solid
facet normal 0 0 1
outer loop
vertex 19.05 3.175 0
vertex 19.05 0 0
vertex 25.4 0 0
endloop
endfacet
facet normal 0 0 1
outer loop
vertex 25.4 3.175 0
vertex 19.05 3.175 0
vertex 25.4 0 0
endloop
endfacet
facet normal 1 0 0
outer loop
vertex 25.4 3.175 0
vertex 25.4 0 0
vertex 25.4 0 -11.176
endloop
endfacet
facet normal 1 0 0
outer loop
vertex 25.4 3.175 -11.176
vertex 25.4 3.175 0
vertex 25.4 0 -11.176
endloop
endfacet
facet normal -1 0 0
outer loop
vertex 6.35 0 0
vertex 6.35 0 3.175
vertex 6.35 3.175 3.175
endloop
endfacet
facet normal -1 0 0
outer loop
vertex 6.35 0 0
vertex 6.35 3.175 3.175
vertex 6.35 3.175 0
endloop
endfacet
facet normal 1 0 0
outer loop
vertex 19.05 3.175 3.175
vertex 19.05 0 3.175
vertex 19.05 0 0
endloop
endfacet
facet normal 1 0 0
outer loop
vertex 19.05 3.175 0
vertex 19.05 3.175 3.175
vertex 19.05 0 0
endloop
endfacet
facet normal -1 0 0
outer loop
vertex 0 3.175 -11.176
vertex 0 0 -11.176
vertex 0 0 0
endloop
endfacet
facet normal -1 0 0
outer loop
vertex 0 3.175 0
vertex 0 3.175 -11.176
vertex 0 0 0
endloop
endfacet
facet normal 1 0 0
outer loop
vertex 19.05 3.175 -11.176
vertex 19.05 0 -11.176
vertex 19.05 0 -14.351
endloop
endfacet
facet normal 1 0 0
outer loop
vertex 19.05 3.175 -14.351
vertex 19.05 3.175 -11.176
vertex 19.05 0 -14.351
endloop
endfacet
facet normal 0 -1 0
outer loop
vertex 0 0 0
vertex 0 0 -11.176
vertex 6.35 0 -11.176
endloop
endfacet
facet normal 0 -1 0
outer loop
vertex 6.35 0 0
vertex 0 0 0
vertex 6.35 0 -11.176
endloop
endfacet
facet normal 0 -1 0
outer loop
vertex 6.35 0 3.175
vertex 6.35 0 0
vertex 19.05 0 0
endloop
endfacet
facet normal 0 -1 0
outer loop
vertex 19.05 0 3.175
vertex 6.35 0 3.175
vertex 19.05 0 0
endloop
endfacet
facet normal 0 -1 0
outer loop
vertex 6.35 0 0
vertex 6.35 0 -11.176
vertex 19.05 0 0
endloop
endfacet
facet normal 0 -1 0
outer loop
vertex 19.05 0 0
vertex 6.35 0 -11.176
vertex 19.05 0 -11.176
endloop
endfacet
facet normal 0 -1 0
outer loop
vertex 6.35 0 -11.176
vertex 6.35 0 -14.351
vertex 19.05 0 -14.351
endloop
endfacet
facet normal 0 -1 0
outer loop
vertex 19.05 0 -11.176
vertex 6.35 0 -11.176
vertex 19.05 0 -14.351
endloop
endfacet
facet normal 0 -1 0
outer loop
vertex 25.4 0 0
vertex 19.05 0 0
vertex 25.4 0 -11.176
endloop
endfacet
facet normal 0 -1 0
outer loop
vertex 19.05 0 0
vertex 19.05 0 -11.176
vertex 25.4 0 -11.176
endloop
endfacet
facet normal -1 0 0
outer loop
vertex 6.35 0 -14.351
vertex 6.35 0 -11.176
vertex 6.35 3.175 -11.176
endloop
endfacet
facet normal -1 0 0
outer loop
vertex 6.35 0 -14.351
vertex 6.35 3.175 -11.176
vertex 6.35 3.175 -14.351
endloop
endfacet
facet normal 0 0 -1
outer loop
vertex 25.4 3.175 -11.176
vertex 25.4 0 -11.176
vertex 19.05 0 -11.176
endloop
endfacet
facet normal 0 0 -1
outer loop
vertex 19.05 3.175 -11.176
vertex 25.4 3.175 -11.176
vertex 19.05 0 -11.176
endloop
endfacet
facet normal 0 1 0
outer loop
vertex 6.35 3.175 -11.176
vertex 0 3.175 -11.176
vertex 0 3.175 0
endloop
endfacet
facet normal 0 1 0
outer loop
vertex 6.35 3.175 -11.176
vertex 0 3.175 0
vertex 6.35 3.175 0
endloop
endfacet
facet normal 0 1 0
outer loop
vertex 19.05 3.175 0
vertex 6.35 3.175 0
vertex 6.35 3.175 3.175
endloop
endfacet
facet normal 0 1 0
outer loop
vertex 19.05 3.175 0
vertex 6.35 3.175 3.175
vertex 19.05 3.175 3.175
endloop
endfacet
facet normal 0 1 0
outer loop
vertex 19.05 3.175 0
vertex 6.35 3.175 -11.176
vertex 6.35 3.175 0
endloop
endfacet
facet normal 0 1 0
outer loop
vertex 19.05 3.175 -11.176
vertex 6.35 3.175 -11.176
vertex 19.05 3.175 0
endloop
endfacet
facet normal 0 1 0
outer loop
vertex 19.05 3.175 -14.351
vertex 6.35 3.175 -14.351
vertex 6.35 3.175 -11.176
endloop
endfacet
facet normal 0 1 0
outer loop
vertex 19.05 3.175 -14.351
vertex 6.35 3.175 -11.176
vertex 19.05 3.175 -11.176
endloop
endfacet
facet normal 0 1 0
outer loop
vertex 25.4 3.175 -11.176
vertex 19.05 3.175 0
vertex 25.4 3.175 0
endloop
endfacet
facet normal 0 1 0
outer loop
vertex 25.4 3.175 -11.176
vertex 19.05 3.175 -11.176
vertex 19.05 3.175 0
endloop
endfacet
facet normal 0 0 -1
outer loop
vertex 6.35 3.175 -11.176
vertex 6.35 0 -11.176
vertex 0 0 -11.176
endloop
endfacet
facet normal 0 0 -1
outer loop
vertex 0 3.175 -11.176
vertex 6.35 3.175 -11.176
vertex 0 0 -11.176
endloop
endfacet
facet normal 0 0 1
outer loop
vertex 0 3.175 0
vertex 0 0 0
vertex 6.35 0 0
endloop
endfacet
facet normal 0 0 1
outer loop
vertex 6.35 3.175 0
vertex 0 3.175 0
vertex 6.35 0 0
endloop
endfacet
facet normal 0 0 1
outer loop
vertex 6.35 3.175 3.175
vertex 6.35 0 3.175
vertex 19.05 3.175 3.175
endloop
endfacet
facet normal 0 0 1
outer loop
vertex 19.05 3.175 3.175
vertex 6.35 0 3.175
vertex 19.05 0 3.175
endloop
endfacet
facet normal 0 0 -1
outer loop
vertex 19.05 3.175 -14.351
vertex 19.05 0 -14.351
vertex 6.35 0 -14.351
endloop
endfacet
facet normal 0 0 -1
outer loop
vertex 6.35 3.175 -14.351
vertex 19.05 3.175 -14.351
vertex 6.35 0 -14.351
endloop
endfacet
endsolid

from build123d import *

# Parameters (mm, degrees)
SKETCH1_W           = 12.7
SKETCH1_H           = 3.175
SKETCH1_W_2         = 6.35
BOSS_EXTRUDE1_DEPTH = 3.175


with BuildPart() as part:
    # Sketch1 → Boss-Extrude1 (new body)
    with BuildSketch(Plane(origin=(0, 0, 0), x_dir=(1, 0, 0), z_dir=(0, 1, 0))):
        Polygon((0, 11.176), (0, 0), (6.35, 0), (19.05, 0), (25.4, 0), (25.4, 11.176), (19.05, 11.176), (12.7, 11.176), (6.35, 11.176), align=None)
        with Locations((12.7, -1.5875)):
            Rectangle(SKETCH1_W, SKETCH1_H)
        with Locations((15.875, 12.7635)):
            Rectangle(SKETCH1_W_2, SKETCH1_H)
        with Locations((9.525, 12.7635)):
            Rectangle(SKETCH1_W_2, SKETCH1_H)
    extrude(amount=BOSS_EXTRUDE1_DEPTH)


solid = part.part
